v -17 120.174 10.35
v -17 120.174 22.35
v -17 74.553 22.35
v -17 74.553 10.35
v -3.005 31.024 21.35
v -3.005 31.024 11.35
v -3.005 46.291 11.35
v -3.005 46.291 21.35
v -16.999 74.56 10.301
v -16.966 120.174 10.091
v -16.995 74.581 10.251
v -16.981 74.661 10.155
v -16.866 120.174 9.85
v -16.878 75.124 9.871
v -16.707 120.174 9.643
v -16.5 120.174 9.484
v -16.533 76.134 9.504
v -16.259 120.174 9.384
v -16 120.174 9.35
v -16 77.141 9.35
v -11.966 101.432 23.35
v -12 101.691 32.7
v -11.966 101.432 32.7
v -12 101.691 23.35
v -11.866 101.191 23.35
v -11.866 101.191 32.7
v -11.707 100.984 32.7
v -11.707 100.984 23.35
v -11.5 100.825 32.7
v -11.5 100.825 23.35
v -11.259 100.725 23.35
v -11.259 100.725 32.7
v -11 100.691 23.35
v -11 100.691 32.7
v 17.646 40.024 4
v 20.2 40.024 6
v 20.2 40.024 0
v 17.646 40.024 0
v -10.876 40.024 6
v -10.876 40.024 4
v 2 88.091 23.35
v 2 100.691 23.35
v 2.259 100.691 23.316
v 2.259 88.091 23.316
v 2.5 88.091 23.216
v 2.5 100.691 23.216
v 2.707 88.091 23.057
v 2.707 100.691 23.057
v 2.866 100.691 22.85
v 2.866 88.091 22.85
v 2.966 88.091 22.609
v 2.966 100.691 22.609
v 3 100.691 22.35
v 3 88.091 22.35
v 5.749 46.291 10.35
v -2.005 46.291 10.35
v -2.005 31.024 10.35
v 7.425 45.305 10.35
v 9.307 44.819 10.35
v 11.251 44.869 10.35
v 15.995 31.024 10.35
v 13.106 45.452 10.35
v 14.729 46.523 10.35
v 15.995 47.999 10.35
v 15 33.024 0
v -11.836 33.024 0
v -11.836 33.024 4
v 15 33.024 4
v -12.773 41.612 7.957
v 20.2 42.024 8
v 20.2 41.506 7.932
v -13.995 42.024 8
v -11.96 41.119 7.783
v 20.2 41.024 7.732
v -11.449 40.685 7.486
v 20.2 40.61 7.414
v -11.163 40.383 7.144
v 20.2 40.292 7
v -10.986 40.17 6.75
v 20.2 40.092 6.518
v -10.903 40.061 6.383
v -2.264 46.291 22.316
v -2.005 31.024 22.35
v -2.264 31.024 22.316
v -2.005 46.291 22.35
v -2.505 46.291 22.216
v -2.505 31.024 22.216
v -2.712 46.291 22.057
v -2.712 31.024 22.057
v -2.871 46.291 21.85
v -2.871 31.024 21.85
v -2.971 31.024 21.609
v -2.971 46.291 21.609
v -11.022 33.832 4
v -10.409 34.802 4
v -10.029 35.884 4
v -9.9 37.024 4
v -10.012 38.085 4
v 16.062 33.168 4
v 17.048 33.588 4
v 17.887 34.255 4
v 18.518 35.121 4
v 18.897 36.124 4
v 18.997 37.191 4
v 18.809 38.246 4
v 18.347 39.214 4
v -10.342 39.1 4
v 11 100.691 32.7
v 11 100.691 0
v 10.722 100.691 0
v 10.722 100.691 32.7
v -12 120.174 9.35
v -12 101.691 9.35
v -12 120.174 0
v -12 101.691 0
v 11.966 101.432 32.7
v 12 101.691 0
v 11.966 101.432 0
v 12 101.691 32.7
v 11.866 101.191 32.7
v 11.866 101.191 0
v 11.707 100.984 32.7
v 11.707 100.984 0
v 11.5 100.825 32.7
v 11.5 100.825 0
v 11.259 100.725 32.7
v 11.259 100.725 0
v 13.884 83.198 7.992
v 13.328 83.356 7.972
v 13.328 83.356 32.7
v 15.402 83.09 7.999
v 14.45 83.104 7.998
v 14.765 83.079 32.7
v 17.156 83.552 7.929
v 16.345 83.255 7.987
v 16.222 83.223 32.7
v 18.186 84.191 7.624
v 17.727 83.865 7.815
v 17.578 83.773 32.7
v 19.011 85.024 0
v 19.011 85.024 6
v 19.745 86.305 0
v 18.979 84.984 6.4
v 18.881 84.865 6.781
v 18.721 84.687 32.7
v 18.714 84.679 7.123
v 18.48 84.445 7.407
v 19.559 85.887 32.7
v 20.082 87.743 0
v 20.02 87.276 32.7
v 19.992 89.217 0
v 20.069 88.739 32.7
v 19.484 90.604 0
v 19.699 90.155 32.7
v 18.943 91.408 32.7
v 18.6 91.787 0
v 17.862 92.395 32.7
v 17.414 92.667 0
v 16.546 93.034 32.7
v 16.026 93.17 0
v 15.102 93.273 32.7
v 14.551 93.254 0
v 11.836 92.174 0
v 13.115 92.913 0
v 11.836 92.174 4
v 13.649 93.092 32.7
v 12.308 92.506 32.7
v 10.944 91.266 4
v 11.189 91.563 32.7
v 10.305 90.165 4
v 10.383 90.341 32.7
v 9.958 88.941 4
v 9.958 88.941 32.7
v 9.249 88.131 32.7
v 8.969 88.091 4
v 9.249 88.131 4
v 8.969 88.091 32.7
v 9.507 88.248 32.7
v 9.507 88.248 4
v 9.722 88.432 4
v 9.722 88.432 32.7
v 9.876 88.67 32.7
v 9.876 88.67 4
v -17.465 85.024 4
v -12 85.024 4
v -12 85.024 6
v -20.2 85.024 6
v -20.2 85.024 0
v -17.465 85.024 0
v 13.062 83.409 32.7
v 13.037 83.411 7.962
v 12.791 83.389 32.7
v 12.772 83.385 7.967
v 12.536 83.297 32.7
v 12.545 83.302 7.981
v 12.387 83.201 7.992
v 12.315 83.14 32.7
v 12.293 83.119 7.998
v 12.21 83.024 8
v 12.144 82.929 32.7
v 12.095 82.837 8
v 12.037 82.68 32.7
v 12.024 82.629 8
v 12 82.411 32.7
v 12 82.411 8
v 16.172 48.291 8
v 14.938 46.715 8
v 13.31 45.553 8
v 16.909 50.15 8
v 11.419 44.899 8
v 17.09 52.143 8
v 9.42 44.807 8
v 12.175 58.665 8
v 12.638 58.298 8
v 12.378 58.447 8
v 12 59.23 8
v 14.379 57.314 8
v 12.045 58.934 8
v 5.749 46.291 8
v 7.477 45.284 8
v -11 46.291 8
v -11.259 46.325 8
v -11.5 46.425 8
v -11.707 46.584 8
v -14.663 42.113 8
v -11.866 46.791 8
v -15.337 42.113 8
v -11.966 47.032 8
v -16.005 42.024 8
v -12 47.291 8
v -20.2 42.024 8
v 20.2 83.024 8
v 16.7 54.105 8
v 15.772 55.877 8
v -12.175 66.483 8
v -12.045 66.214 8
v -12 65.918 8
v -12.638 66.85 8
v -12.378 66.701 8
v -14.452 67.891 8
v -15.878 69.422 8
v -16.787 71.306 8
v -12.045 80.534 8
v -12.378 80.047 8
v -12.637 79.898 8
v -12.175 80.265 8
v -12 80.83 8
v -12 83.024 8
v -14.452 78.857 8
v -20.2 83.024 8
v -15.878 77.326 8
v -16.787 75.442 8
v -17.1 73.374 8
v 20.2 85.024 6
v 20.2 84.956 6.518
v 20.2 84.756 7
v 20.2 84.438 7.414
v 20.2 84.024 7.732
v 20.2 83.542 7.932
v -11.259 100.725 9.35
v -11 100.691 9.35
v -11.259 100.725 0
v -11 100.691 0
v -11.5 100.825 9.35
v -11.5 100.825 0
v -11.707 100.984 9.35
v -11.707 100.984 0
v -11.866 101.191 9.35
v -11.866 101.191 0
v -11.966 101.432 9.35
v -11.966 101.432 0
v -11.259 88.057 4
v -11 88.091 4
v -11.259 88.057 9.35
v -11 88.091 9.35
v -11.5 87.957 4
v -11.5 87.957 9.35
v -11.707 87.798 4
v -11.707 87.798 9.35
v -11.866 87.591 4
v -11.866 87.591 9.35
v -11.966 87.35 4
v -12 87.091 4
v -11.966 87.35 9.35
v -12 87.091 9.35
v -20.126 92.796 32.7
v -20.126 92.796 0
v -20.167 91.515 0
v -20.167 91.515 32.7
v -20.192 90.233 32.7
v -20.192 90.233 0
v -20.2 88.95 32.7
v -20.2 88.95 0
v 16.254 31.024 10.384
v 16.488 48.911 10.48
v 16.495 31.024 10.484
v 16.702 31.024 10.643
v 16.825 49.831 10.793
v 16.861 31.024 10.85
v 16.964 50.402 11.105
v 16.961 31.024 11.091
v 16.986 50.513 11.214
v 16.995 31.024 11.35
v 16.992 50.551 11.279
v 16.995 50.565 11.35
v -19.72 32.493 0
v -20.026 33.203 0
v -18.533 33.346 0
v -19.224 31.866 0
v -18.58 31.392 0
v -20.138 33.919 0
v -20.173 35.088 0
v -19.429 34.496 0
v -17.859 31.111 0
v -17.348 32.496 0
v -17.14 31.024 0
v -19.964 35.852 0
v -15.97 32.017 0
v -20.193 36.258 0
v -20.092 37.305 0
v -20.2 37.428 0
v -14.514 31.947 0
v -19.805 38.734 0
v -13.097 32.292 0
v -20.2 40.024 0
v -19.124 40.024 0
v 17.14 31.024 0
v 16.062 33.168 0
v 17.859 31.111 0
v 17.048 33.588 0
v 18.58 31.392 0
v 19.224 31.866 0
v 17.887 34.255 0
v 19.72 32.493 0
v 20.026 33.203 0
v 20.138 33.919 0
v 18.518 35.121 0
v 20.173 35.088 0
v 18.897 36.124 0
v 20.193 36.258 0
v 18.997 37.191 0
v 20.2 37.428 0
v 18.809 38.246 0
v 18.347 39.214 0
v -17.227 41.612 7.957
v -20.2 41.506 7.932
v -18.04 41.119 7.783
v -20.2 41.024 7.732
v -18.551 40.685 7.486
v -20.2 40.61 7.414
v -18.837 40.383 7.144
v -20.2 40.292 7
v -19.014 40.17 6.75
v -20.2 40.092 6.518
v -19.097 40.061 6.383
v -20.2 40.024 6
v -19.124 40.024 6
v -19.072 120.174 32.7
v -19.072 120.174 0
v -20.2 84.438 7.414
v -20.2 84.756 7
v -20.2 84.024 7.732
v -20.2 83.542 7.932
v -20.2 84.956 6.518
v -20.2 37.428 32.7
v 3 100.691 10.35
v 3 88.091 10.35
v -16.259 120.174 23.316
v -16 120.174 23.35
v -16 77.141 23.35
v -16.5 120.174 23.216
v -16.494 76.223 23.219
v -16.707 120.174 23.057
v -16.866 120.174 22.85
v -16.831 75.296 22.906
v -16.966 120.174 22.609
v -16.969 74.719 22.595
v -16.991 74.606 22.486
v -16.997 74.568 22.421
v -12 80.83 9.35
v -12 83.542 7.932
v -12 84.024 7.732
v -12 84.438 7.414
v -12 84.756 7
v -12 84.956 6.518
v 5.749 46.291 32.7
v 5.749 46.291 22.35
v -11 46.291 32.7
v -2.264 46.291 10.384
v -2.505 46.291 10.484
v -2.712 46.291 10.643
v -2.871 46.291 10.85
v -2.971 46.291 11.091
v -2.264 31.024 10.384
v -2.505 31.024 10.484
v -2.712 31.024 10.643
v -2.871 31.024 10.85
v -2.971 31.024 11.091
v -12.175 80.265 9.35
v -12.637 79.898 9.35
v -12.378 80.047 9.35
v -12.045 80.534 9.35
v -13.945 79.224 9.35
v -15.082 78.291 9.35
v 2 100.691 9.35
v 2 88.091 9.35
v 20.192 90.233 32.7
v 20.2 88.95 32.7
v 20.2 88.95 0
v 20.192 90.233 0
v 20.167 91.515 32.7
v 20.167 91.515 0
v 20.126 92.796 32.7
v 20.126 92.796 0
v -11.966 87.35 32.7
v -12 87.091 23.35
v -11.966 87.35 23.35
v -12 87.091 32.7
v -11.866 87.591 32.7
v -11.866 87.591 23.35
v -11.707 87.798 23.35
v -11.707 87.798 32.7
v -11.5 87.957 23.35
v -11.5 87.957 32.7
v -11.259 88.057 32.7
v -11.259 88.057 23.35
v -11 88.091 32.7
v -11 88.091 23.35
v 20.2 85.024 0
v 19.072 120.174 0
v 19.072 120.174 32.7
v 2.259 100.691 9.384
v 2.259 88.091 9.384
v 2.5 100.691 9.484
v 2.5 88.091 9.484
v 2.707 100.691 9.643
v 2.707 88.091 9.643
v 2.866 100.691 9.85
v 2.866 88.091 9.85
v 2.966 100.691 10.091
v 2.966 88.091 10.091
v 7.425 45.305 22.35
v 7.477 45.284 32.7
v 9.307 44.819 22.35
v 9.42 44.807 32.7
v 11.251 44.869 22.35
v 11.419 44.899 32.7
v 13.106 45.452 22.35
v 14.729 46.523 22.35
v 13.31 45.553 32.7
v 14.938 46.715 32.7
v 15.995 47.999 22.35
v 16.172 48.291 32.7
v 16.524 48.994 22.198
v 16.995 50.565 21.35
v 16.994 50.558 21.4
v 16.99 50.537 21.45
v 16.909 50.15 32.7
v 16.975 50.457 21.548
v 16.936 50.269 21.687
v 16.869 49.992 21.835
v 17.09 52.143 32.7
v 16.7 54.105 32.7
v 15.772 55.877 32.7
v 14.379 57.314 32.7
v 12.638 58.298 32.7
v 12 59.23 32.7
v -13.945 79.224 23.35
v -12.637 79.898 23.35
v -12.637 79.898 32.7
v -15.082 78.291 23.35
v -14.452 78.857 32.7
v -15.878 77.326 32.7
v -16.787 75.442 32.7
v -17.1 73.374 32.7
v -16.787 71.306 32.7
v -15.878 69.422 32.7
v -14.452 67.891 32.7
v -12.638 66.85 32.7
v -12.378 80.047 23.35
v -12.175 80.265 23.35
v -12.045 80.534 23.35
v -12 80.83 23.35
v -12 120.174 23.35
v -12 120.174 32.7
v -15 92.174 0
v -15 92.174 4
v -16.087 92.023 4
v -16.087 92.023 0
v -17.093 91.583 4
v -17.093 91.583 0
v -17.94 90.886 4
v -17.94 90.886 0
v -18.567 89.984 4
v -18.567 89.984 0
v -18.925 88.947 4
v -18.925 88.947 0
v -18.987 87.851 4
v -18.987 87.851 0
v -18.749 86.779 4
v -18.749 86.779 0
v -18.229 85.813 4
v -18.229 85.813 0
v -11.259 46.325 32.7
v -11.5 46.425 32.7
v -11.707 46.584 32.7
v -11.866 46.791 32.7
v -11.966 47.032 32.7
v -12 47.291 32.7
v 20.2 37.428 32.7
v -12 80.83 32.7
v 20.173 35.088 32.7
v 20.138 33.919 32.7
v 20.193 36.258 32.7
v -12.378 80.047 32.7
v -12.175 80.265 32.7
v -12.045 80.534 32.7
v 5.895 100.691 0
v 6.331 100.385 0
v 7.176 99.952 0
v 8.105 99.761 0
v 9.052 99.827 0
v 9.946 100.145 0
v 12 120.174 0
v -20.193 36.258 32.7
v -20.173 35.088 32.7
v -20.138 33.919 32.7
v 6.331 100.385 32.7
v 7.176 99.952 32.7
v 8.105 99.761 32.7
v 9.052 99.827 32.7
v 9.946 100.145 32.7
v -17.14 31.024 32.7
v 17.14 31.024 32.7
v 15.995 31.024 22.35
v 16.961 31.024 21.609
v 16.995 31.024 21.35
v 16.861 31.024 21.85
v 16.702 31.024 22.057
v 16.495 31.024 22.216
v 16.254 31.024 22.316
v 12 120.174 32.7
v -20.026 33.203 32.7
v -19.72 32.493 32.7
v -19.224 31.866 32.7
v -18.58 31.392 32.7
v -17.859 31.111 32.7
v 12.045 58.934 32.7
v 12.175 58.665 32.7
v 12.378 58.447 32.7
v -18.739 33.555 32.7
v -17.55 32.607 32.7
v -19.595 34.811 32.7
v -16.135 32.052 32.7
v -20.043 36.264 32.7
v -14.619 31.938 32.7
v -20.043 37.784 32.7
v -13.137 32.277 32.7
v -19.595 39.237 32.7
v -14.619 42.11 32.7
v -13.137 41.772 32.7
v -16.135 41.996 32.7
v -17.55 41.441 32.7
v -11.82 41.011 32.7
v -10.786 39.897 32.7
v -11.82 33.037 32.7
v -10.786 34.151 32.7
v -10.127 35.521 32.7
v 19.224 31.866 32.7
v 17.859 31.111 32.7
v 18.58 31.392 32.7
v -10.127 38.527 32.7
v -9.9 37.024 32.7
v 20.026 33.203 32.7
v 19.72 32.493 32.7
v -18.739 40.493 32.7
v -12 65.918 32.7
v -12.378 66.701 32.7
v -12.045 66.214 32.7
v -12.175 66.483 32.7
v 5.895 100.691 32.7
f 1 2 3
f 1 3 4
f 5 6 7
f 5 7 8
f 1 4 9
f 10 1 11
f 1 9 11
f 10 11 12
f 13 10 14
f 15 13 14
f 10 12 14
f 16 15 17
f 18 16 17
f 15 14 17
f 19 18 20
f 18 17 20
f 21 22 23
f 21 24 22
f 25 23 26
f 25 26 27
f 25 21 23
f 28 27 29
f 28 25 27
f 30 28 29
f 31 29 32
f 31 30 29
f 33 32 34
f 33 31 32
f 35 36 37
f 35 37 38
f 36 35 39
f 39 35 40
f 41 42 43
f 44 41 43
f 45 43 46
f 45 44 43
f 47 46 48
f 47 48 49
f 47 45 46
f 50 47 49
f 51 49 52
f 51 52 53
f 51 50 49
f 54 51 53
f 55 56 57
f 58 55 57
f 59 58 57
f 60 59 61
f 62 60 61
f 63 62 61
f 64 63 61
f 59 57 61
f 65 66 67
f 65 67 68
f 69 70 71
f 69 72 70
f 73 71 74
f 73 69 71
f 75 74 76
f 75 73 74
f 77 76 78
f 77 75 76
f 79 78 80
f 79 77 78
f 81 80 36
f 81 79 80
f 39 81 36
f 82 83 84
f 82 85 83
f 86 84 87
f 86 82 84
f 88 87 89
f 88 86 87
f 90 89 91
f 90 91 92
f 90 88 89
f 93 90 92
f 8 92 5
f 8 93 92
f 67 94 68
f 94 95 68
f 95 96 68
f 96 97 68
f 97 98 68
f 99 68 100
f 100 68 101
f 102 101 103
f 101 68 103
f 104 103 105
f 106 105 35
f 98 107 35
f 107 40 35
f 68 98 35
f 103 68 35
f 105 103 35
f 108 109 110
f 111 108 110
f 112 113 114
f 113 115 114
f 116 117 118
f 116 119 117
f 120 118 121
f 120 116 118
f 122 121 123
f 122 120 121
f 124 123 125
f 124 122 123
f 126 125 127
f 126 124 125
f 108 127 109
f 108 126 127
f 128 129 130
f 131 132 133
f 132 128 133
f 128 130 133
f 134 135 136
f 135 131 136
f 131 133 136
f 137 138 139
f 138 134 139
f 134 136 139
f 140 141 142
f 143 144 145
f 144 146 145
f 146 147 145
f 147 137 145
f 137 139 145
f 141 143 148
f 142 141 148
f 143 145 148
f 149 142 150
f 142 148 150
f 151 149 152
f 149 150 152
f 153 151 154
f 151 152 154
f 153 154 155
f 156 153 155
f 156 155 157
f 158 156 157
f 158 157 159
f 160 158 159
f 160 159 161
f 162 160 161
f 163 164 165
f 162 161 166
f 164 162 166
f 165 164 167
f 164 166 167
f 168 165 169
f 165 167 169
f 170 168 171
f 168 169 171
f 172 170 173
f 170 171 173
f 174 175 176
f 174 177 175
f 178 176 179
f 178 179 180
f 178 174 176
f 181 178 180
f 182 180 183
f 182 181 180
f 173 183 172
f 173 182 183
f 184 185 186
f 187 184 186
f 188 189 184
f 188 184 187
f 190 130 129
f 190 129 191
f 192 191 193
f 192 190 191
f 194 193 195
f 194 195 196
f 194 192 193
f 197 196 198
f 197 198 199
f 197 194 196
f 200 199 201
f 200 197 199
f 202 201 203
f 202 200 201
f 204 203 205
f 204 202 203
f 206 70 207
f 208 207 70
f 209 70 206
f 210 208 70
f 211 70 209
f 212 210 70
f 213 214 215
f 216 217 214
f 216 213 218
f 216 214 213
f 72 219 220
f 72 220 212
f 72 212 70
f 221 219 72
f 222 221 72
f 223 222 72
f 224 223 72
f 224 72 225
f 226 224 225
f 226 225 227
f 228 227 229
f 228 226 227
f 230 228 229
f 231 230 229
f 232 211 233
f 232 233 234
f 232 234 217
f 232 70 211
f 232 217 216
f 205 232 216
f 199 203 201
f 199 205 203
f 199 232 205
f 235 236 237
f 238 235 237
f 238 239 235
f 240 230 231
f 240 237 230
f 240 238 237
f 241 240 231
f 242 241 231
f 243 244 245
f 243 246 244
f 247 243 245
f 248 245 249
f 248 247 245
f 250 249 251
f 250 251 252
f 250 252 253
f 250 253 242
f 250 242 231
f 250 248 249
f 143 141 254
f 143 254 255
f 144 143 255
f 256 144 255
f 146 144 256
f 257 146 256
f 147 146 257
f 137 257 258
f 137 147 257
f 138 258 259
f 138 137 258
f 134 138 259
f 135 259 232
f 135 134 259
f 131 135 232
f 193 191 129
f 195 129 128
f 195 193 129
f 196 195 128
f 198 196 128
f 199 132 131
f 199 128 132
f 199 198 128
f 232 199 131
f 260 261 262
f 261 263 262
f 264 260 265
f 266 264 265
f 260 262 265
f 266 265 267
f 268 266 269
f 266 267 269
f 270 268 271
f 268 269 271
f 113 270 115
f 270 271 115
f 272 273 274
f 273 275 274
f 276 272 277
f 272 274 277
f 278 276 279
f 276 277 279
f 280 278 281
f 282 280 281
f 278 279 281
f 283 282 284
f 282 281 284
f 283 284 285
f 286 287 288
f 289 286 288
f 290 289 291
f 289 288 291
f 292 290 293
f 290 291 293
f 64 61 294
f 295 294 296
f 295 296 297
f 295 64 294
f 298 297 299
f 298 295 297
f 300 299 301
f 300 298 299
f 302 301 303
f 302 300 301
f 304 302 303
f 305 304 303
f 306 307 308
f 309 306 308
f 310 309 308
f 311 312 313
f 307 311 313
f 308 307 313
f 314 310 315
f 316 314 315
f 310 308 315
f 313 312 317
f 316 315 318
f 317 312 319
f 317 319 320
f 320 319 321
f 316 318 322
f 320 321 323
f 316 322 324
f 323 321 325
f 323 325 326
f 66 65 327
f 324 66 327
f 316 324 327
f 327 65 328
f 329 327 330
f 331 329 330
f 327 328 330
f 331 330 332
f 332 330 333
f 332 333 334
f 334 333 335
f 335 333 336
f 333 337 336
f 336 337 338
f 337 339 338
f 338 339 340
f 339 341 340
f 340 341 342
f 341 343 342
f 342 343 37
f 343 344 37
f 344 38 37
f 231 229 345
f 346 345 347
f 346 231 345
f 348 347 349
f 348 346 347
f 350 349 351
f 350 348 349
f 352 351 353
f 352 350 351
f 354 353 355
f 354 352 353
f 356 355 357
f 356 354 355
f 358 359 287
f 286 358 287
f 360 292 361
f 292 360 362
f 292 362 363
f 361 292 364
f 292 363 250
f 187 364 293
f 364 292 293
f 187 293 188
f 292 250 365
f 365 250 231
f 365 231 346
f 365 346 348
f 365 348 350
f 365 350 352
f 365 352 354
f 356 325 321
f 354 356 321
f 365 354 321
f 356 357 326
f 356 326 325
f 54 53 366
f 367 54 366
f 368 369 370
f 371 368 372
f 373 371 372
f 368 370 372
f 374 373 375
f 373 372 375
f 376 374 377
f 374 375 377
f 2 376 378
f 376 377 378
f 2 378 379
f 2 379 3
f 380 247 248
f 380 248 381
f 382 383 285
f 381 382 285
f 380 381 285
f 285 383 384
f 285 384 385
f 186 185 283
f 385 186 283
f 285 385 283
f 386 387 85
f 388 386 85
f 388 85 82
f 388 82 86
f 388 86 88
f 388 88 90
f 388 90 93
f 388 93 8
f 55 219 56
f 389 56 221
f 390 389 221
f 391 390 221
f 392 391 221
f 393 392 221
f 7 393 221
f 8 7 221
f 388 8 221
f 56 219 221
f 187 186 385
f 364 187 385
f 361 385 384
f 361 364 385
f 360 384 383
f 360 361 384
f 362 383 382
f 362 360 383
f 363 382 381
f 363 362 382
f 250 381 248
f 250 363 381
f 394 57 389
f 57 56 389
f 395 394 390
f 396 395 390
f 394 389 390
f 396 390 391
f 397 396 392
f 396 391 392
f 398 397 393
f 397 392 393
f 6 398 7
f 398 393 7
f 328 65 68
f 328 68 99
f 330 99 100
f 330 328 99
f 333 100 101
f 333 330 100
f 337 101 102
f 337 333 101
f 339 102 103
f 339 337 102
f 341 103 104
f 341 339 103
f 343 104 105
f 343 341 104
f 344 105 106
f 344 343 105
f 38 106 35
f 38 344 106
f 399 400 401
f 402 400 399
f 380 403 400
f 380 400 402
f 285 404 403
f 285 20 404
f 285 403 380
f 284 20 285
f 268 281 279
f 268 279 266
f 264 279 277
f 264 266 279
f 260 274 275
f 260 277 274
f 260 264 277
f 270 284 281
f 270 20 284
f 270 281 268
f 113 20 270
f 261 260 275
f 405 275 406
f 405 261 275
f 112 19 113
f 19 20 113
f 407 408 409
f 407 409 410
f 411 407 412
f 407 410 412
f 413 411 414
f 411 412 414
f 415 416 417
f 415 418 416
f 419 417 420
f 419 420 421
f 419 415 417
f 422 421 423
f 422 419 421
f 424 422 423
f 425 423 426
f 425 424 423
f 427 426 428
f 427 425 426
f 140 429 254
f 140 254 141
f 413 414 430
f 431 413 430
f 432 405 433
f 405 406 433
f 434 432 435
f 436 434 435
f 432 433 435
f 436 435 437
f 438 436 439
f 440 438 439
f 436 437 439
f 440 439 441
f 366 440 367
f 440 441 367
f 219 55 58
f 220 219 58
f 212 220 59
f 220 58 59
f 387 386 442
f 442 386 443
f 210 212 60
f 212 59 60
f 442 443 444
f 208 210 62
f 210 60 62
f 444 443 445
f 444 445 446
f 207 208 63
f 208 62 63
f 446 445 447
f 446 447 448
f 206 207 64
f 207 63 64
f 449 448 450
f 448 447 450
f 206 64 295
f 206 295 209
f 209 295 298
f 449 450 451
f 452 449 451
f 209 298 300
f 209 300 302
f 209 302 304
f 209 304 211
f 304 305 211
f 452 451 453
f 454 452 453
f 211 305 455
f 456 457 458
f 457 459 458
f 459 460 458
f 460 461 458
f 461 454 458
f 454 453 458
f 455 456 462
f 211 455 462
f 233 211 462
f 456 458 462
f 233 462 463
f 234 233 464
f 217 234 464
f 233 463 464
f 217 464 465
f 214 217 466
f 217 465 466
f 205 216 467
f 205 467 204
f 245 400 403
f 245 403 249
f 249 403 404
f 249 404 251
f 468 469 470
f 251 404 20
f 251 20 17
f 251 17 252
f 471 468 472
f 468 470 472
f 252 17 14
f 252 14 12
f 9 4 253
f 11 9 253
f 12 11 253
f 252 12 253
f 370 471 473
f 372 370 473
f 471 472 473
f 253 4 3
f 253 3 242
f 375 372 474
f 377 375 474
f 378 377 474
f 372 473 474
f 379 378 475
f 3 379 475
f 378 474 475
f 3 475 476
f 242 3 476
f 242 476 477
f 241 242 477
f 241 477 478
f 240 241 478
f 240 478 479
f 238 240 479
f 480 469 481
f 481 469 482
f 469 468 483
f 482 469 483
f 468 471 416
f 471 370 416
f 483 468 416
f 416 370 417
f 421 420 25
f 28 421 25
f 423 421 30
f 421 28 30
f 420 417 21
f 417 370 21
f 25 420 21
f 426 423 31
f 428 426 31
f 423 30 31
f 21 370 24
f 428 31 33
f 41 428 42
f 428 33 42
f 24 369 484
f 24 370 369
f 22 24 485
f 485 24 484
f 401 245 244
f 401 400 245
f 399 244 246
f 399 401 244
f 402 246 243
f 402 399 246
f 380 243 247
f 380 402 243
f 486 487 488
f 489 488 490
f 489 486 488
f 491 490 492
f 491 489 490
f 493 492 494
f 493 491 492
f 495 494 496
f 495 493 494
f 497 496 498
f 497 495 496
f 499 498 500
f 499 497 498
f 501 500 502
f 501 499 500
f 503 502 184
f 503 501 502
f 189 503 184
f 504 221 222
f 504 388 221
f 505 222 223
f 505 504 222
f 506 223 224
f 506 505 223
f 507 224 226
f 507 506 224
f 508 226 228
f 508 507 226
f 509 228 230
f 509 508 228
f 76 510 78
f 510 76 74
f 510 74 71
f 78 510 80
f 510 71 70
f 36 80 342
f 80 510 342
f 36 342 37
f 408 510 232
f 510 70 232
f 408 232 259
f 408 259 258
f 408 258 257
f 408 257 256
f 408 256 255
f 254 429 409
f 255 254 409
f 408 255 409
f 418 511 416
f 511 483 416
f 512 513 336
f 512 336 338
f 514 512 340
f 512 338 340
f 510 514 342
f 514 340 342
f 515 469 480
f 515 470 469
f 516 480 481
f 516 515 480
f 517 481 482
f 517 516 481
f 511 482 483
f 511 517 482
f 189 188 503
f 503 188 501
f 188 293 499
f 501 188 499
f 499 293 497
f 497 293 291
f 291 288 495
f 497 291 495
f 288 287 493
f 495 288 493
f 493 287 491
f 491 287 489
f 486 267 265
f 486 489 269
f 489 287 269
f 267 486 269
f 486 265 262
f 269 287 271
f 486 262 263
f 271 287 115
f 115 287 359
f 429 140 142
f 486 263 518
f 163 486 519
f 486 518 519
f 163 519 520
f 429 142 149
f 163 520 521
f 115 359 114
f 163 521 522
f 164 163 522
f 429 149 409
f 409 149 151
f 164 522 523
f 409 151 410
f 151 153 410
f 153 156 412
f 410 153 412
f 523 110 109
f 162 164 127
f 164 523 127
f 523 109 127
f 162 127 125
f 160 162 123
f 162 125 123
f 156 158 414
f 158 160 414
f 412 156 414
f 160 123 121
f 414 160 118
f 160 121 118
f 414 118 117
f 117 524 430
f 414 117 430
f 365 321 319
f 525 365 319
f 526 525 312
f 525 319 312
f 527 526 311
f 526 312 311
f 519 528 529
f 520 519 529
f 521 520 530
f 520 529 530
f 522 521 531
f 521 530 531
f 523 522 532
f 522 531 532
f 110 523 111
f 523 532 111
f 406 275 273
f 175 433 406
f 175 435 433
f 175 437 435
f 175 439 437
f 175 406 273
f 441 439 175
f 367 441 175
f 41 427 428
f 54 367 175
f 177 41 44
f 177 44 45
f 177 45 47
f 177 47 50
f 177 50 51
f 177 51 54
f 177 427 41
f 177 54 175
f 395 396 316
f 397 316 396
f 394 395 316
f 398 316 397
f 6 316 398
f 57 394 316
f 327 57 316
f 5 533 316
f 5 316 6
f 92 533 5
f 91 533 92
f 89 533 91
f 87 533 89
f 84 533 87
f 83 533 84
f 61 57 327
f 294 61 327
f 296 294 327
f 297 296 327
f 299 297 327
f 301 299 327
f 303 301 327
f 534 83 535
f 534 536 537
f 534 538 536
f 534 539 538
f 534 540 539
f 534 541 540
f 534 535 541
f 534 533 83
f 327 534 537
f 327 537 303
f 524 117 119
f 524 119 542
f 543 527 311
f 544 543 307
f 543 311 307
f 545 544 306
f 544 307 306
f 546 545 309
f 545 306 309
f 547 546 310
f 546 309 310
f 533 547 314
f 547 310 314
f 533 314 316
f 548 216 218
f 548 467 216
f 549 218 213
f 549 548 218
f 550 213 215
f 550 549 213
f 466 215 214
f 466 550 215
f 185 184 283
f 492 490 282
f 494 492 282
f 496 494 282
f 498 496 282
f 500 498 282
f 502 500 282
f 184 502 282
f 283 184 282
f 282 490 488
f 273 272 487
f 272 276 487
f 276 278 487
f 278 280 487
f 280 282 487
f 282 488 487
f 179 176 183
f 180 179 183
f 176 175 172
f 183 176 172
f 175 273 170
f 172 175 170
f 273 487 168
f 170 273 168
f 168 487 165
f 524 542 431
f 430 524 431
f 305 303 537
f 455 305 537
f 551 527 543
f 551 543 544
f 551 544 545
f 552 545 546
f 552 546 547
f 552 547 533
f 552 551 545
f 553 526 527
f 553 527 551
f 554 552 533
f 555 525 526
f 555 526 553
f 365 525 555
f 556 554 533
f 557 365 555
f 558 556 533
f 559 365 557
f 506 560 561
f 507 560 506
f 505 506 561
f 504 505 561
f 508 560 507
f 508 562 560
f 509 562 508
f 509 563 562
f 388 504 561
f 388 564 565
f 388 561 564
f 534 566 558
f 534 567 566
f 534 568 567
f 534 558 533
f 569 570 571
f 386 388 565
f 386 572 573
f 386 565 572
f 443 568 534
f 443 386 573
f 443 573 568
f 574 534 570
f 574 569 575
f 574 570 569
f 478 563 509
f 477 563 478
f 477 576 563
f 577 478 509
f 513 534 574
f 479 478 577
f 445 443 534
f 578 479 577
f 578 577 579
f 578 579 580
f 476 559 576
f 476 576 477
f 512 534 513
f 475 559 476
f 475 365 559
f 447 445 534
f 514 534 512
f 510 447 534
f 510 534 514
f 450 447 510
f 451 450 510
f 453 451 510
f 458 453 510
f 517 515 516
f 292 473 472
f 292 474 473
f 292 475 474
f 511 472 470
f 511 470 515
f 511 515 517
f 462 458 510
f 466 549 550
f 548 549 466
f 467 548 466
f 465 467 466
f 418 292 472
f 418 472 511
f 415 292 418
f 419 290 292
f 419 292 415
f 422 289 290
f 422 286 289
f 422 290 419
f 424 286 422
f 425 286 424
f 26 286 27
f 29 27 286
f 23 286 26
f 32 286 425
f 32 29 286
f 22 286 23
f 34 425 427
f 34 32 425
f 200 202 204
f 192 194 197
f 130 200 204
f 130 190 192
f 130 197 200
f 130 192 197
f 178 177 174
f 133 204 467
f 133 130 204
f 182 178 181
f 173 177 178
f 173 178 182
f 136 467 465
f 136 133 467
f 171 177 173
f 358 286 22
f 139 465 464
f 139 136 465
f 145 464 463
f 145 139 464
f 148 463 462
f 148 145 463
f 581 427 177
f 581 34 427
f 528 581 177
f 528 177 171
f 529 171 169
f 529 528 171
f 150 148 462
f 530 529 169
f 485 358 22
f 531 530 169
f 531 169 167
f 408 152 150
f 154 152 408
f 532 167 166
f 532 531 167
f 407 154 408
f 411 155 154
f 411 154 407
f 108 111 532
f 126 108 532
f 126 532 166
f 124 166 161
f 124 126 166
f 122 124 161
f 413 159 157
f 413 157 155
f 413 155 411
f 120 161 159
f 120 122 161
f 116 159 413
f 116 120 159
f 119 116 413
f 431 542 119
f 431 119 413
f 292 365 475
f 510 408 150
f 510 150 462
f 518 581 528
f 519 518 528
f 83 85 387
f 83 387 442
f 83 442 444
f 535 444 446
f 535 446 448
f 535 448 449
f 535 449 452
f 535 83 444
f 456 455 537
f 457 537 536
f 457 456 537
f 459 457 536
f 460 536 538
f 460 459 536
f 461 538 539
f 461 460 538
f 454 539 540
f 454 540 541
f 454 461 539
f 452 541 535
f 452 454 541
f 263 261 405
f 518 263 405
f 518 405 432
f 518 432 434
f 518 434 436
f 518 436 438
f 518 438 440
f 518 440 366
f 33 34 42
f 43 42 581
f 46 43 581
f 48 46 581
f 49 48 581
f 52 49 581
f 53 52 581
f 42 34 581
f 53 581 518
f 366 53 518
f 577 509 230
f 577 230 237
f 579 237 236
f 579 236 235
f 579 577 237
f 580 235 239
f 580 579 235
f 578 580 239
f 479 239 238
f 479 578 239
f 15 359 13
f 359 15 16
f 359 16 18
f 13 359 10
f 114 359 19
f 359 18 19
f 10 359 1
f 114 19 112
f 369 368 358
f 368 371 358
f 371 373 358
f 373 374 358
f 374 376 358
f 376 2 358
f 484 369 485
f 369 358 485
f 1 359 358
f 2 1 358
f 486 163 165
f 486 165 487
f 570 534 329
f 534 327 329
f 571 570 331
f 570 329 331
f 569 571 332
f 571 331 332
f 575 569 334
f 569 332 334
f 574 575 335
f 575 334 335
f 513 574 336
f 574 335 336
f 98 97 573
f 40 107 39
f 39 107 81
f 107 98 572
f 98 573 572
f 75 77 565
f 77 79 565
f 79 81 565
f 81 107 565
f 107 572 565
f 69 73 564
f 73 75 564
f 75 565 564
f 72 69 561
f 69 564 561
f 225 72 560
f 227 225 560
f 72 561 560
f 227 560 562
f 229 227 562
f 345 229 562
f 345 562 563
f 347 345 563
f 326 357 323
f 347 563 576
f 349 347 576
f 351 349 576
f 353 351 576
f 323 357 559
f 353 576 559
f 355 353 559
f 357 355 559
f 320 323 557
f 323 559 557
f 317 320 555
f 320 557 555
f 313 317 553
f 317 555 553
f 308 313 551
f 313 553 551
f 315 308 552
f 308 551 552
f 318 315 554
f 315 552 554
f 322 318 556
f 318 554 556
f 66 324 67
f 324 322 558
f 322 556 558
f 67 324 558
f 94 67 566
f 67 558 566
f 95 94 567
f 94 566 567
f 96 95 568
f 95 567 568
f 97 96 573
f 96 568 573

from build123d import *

# Parameters (mm, degrees)
SKETCH1_R               = 7.95
SKETCH1_R_2             = 3
MAIN_BODY_LINK_B1_DEPTH = 32.7
CUT_EXTRUDE2_REACH      = 172.091
CUT_EXTRUDE3_REACH      = 172.091
SKETCH5_R               = 1.5
PULLEYIDLERUP_DEPTH     = 32.7
CUT_EXTRUDE5_DEPTH      = 32.7
FILLET5_R               = 100
SKETCH8_R               = 15.25
CUT_EXTRUDE6_DEPTH      = 171.090551712
SKETCH9_R               = 5.1
SKETCH9_W               = 38.1446978
SKETCH9_H               = 45.516821784
SKETCH9_W_2             = 39.989573096
SKETCH9_H_2             = 49.024052381
CUT_EXTRUDE7_DEPTH      = 171.090551712
SKETCH10_W              = 24
SKETCH10_H              = 41.8
SKETCH10_H_2            = 19.483178216
CUT_EXTRUDE8_DEPTH      = 127.171046068
SKETCH12_R              = 7
CUT_EXTRUDE13_DEPTH     = 127.171046068
SKETCH16_W              = 40.4
SKETCH16_H              = 45
CUT_EXTRUDE18_DEPTH     = 8
SKETCH18_W              = 20
SKETCH18_H              = 14
CUT_EXTRUDE19_DEPTH     = 47
SKETCH19_W              = 20
SKETCH19_H              = 12
CUT_EXTRUDE20_DEPTH     = 20
CUT_EXTRUDE21_DEPTH     = 4
FILLET6_R               = 3
FILLET7_R               = 1
FILLET8_R               = 1
FILLET9_R               = 2


with BuildPart() as part:
    # Sketch1 → Main Body Link B1 (new body)
    with BuildSketch(Plane.XY):
        with BuildLine():
            Line((20.2, 41.674052381), (20.2, 83.474052381))
            Line((20.2, 83.474052381), (20.2, 90.874052381))
            Line((20.2, 90.874052381), (17.986683974, 148.383116621))
            ThreePointArc((17.986683974, 148.383116621), (0, 165.690874165), (-17.986683974, 148.383116621))
            Line((-17.986683974, 148.383116621), (-20.2, 90.874052381))
            Line((-20.2, 90.874052381), (-20.2, 83.474052381))
            Line((-20.2, 83.474052381), (-20.2, 41.674052381))
            Line((-20.2, 41.674052381), (-20.2, 34.274052381))
            Line((-20.2, 34.274052381), (-17.964224051, -1.134307826))
            ThreePointArc((-17.964224051, -1.134307826), (0, -18), (17.964224051, -1.134307826))
            Line((17.964224051, -1.134307826), (20.2, 34.274052381))
            Line((20.2, 34.274052381), (20.2, 41.674052381))
        make_face()
        Circle(SKETCH1_R, mode=Mode.SUBTRACT)
        with Locations((15, 88.174052381)):
            Circle(SKETCH1_R_2, mode=Mode.SUBTRACT)
        with Locations((-15, 37.024052381)):
            Circle(SKETCH1_R_2, mode=Mode.SUBTRACT)
        with Locations((0, 147.690874165)):
            Circle(SKETCH1_R, mode=Mode.SUBTRACT)
    extrude(amount=MAIN_BODY_LINK_B1_DEPTH)

    # Sketch4 → Cut-Extrude2 (cut, up to next)
    with BuildSketch(Plane.XY.offset(32.7), mode=Mode.PRIVATE) as cut_extrude2_sk1:
        with BuildLine():
            Line((-12, 134.2744663), (-12, 123.584968066))
            Line((-12, 123.584968066), (-2.929911079, 129.930929878))
            ThreePointArc((-2.929911079, 129.930929878), (-7.774454217, 131.456408925), (-12, 134.2744663))
        make_face()
    cut_extrude2_tool1 = extrude(cut_extrude2_sk1.sketch, amount=-CUT_EXTRUDE2_REACH, mode=Mode.PRIVATE) & part.part
    # Sketch4 → Cut-Extrude2 (cut, up to next)
    with BuildSketch(Plane.XY.offset(32.7), mode=Mode.PRIVATE) as cut_extrude2_sk2:
        Polygon((-12, 100.690874165), (3.278172542, 100.690874165), (-12, 111.380372399), align=None)
    cut_extrude2_tool2 = extrude(cut_extrude2_sk2.sketch, amount=-CUT_EXTRUDE2_REACH, mode=Mode.PRIVATE) & part.part
    # Sketch4 → Cut-Extrude2 (cut, up to next)
    with BuildSketch(Plane.XY.offset(32.7), mode=Mode.PRIVATE) as cut_extrude2_sk3:
        Polygon((12, 128.172168466), (12, 106.793171999), (-3.278172542, 117.482670232), align=None)
    cut_extrude2_tool3 = extrude(cut_extrude2_sk3.sketch, amount=-CUT_EXTRUDE2_REACH, mode=Mode.PRIVATE) & part.part
    # Sketch4 → Cut-Extrude2 (cut, up to next)
    with BuildSketch(Plane.XY.offset(32.7), mode=Mode.PRIVATE) as cut_extrude2_sk4:
        Polygon((-4.386441158, 88.090874165), (12, 88.090874165), (12, 73.82101499), align=None)
    cut_extrude2_tool4 = extrude(cut_extrude2_sk4.sketch, amount=-CUT_EXTRUDE2_REACH, mode=Mode.PRIVATE) & part.part
    # Sketch4 → Cut-Extrude2 (cut, up to next)
    with BuildSketch(Plane.XY.offset(32.7), mode=Mode.PRIVATE) as cut_extrude2_sk5:
        Polygon((-12, 81.46073334), (-12, 52.92101499), (4.386441158, 67.190874165), align=None)
    cut_extrude2_tool5 = extrude(cut_extrude2_sk5.sketch, amount=-CUT_EXTRUDE2_REACH, mode=Mode.PRIVATE) & part.part
    # Sketch4 → Cut-Extrude2 (cut, up to next)
    with BuildSketch(Plane.XY.offset(32.7), mode=Mode.PRIVATE) as cut_extrude2_sk6:
        Polygon((-4.386441158, 46.290874165), (12, 46.290874165), (12, 60.56073334), align=None)
    cut_extrude2_tool6 = extrude(cut_extrude2_sk6.sketch, amount=-CUT_EXTRUDE2_REACH, mode=Mode.PRIVATE) & part.part
    add(cut_extrude2_tool1.solids().sort_by_distance((-9.12997, 128.978342, 32.7))[0], mode=Mode.SUBTRACT)
    add(cut_extrude2_tool2.solids().sort_by_distance((-6.907276, 104.25404, 32.7))[0], mode=Mode.SUBTRACT)
    add(cut_extrude2_tool3.solids().sort_by_distance((6.907276, 117.48267, 32.7))[0], mode=Mode.SUBTRACT)
    add(cut_extrude2_tool4.solids().sort_by_distance((6.537853, 83.334254, 32.7))[0], mode=Mode.SUBTRACT)
    add(cut_extrude2_tool5.solids().sort_by_distance((-6.537853, 67.190874, 32.7))[0], mode=Mode.SUBTRACT)
    add(cut_extrude2_tool6.solids().sort_by_distance((6.537853, 51.047494, 32.7))[0], mode=Mode.SUBTRACT)

    # Sketch5 → Cut-Extrude3 (cut, up to next)
    with BuildSketch(Plane.XY.offset(32.7), mode=Mode.PRIVATE) as cut_extrude3_sk1:
        with Locations((11.5, 147.690874165)):
            Circle(SKETCH5_R)
    cut_extrude3_tool1 = extrude(cut_extrude3_sk1.sketch, amount=-CUT_EXTRUDE3_REACH, mode=Mode.PRIVATE) & part.part
    # Sketch5 → Cut-Extrude3 (cut, up to next)
    with BuildSketch(Plane.XY.offset(32.7), mode=Mode.PRIVATE) as cut_extrude3_sk2:
        with Locations((-11.5, 147.690874165)):
            Circle(SKETCH5_R)
    cut_extrude3_tool2 = extrude(cut_extrude3_sk2.sketch, amount=-CUT_EXTRUDE3_REACH, mode=Mode.PRIVATE) & part.part
    # Sketch5 → Cut-Extrude3 (cut, up to next)
    with BuildSketch(Plane.XY.offset(32.7), mode=Mode.PRIVATE) as cut_extrude3_sk3:
        with Locations((-11.5, 0)):
            Circle(SKETCH5_R)
    cut_extrude3_tool3 = extrude(cut_extrude3_sk3.sketch, amount=-CUT_EXTRUDE3_REACH, mode=Mode.PRIVATE) & part.part
    # Sketch5 → Cut-Extrude3 (cut, up to next)
    with BuildSketch(Plane.XY.offset(32.7), mode=Mode.PRIVATE) as cut_extrude3_sk4:
        with Locations((11.5, 0)):
            Circle(SKETCH5_R)
    cut_extrude3_tool4 = extrude(cut_extrude3_sk4.sketch, amount=-CUT_EXTRUDE3_REACH, mode=Mode.PRIVATE) & part.part
    add(cut_extrude3_tool1.solids().sort_by_distance((11.5, 147.690874, 32.7))[0], mode=Mode.SUBTRACT)
    add(cut_extrude3_tool2.solids().sort_by_distance((-11.5, 147.690874, 32.7))[0], mode=Mode.SUBTRACT)
    add(cut_extrude3_tool3.solids().sort_by_distance((-11.5, 0, 32.7))[0], mode=Mode.SUBTRACT)
    add(cut_extrude3_tool4.solids().sort_by_distance((11.5, 0, 32.7))[0], mode=Mode.SUBTRACT)

    # Sketch6 → PulleyIdlerUp (cut)
    with BuildSketch(Plane.XY.offset(32.7)):
        with BuildLine():
            Line((-5.959092644, 108.984491566), (6.331359583, 100.385376259))
            ThreePointArc((6.331359583, 100.385376259), (11.205592008, 101.246688207), (10.34428006, 106.120920631))
            Line((10.34428006, 106.120920631), (-1.946172167, 114.720035938))
            ThreePointArc((-1.946172167, 114.720035938), (-6.820404592, 113.85872399), (-5.959092644, 108.984491566))
        make_face()
    extrude(amount=-PULLEYIDLERUP_DEPTH, mode=Mode.SUBTRACT)

    # Sketch7 → Cut-Extrude5 (cut)
    with BuildSketch(Plane.XY.offset(32.7)):
        with BuildLine():
            Line((-11.837342059, 24.015885081), (0.449938606, 15.412238536))
            ThreePointArc((0.449938606, 15.412238536), (5.324488288, 16.271753164), (4.46497366, 21.146302846))
            Line((4.46497366, 21.146302846), (-7.822307004, 29.749949391))
            ThreePointArc((-7.822307004, 29.749949391), (-12.696856686, 28.890434763), (-11.837342059, 24.015885081))
        make_face()
    extrude(amount=-CUT_EXTRUDE5_DEPTH, mode=Mode.SUBTRACT)

    # Fillet5
    # the kernel refuses this fillet: 100 mm, written as the material it takes off along each edge
    with BuildSketch(Plane(origin=(-20.2, 34.274052381, -7.884973578), x_dir=(0, 1, 0), z_dir=(0, 0, 1))) as fillet5_piece_1:
        with BuildLine():
            CenterArc((FILLET5_R * 0.0315398943126, -FILLET5_R), FILLET5_R, 90, 3.613007947)
            Line((-FILLET5_R * 0.0314772071099, -FILLET5_R * 0.00198755271875), (0, 0))
            Line((0, 0), (FILLET5_R * 0.0315398943126, 0))
        make_face()
    extrude(amount=48.469947156, mode=Mode.SUBTRACT)
    with BuildSketch(Plane(origin=(-20.2, 90.874052381, -4.809018086), x_dir=(0.03845791424359976, 0.9992602207793684, 0), z_dir=(0, 0, 1))) as fillet5_piece_2:
        with BuildLine():
            CenterArc((FILLET5_R * 0.0192360723451, -FILLET5_R), FILLET5_R, 90, 2.204019698)
            Line((-FILLET5_R * 0.0192218418985, -FILLET5_R * 0.000739779220632), (0, 0))
            Line((0, 0), (FILLET5_R * 0.0192360723451, 0))
        make_face()
    extrude(amount=42.318036173, mode=Mode.SUBTRACT)
    with BuildSketch(Plane(origin=(20.2, 90.874052381, -4.809018086), x_dir=(-0.03845791424359111, 0.9992602207793686, 0), z_dir=(0, 0, 1))) as fillet5_piece_3:
        with BuildLine():
            CenterArc((FILLET5_R * 0.0192360723451, FILLET5_R), FILLET5_R, 267.795980302, 2.204019698)
            Line((-FILLET5_R * 0.0192218418985, FILLET5_R * 0.000739779220631), (0, 0))
            Line((0, 0), (FILLET5_R * 0.0192360723451, 0))
        make_face()
    extrude(amount=42.318036173, mode=Mode.SUBTRACT)
    with BuildSketch(Plane(origin=(20.2, 34.274052381, -7.884973578), x_dir=(0, 1, 0), z_dir=(0, 0, 1))) as fillet5_piece_4:
        with BuildLine():
            CenterArc((FILLET5_R * 0.0315398943126, FILLET5_R), FILLET5_R, 266.386992053, 3.613007947)
            Line((-FILLET5_R * 0.0314772071099, FILLET5_R * 0.00198755271875), (0, 0))
            Line((0, 0), (FILLET5_R * 0.0315398943126, 0))
        make_face()
    extrude(amount=48.469947156, mode=Mode.SUBTRACT)

    # Sketch8 → Cut-Extrude6 (cut, through all)
    with BuildSketch(Plane.XY.offset(32.7)):
        Circle(SKETCH8_R)
        with Locations((0, 147.690874165)):
            Circle(SKETCH8_R)
    extrude(amount=-CUT_EXTRUDE6_DEPTH, mode=Mode.SUBTRACT)

    # Sketch9 → Cut-Extrude7 (cut, through all)
    with BuildSketch(Plane.XY.offset(32.7)):
        with Locations((15, 88.174052381)):
            Circle(SKETCH9_R)
        with Locations((-15, 37.024052381)):
            Circle(SKETCH9_R)
        with Locations((0, 142.932463273)):
            Rectangle(SKETCH9_W, SKETCH9_H)
        with Locations((0, 6.512026191)):
            Rectangle(SKETCH9_W_2, SKETCH9_H_2)
    extrude(amount=-CUT_EXTRUDE7_DEPTH, mode=Mode.SUBTRACT)

    # Sketch10 → Cut-Extrude8 (cut, through all)
    with BuildSketch(Plane(origin=(0, 0, 0), x_dir=(-1, 0, 0), z_dir=(0, 0, -1))):
        with Locations((0, 67.190874165)):
            Rectangle(SKETCH10_W, SKETCH10_H)
        with Locations((0, 110.432463273)):
            Rectangle(SKETCH10_W, SKETCH10_H_2)
    extrude(amount=-CUT_EXTRUDE8_DEPTH, mode=Mode.SUBTRACT)

    # Sketch12 → Cut-Extrude13 (cut, through all)
    with BuildSketch(Plane.XY.offset(32.7)):
        with Locations((-10.1, 73.374052381)):
            Circle(SKETCH12_R)
        with Locations((10.1, 51.774052381)):
            Circle(SKETCH12_R)
    extrude(amount=-CUT_EXTRUDE13_DEPTH, mode=Mode.SUBTRACT)

    # Sketch16 → Cut-Extrude18 (cut)
    with BuildSketch(Plane(origin=(0, 0, 0), x_dir=(-1, 0, 0), z_dir=(0, 0, -1))):
        with Locations((0, 62.524052381)):
            Rectangle(SKETCH16_W, SKETCH16_H)
    extrude(amount=-CUT_EXTRUDE18_DEPTH, mode=Mode.SUBTRACT)

    # Sketch18 → Cut-Extrude19 (cut)
    with BuildSketch(Plane(origin=(0, 120.174052381, 0), x_dir=(1, 0, 0), z_dir=(0, 1, 0))):
        with Locations((-7, -16.35)):
            Rectangle(SKETCH18_W, SKETCH18_H)
    extrude(amount=-CUT_EXTRUDE19_DEPTH, mode=Mode.SUBTRACT)

    # Sketch19 → Cut-Extrude20 (cut)
    with BuildSketch(Plane.XZ.offset(-31.024052381)):
        with Locations((6.994786548, 16.35)):
            Rectangle(SKETCH19_W, SKETCH19_H)
    extrude(amount=-CUT_EXTRUDE20_DEPTH, mode=Mode.SUBTRACT)

    # Sketch20 → Cut-Extrude21 (cut)
    with BuildSketch(Plane(origin=(0, 0, 0), x_dir=(-1, 0, 0), z_dir=(0, 0, -1))):
        with BuildLine():
            Line((-15, 92.174052381), (15, 92.174052381))
            ThreePointArc((15, 92.174052381), (19, 88.174052381), (15, 84.174052381))
            Line((15, 84.174052381), (-15, 84.174052381))
            ThreePointArc((-15, 84.174052381), (-19, 88.174052381), (-15, 92.174052381))
        make_face()
        with BuildLine():
            Line((15, 33.024052381), (-15, 33.024052381))
            ThreePointArc((-15, 33.024052381), (-19, 37.024052381), (-15, 41.024052381))
            Line((-15, 41.024052381), (15, 41.024052381))
            ThreePointArc((15, 41.024052381), (19, 37.024052381), (15, 33.024052381))
        make_face()
    extrude(amount=-CUT_EXTRUDE21_DEPTH, mode=Mode.SUBTRACT)

    # Fillet6
    fillet6_edges = [part.edges().sort_by_distance(p)[0] for p in [
        (19.994786548, 31.024052381, 16.35),
        (-19.994786548, 31.024052381, 16.35),
    ]]
    fillet(fillet6_edges, radius=FILLET6_R)

    # Fillet7
    fillet7_edges = [part.edges().sort_by_distance(p)[0] for p in [
        (12, 84.049734256, 20.35),
        (-12, 46.290874165, 20.35),
        (-12, 88.090874165, 28.025),
        (12, 100.690874165, 16.35),
        (-12, 80.111262487, 28.025),
        (12, 58.511262487, 20.35),
        (-12, 66.636842276, 20.35),
        (-12, 80.111262487, 8.675),
        (-12, 88.090874165, 6.675),
        (-12, 100.690874165, 28.025),
        (9.900678341, 88.090874165, 18.35),
        (-12, 100.690874165, 4.675),
    ]]
    fillet(fillet7_edges, radius=FILLET7_R)

    # Fillet8
    fillet8_edges = [part.edges().sort_by_distance(p)[0] for p in [
        (3, 94.390874165, 9.35),
        (-17, 97.363543688, 23.35),
        (-17, 97.363543688, 9.35),
        (3, 94.390874165, 23.35),
        (-3.005213452, 38.657463273, 10.35),
        (16.994786548, 40.794503281, 22.35),
        (16.994786548, 40.794503281, 10.35),
        (-3.005213452, 38.657463273, 22.35),
    ]]
    fillet(fillet8_edges, radius=FILLET8_R)

    # Fillet9
    fillet9_edges = [part.edges().sort_by_distance(p)[0] for p in [
        (4.662159063, 40.024052381, 8),
        (-16.1, 85.024052381, 8),
        (19.605461294, 85.024052381, 8),
        (-19.662159063, 40.024052381, 8),
    ]]
    fillet(fillet9_edges, radius=FILLET9_R)


solid = part.part
